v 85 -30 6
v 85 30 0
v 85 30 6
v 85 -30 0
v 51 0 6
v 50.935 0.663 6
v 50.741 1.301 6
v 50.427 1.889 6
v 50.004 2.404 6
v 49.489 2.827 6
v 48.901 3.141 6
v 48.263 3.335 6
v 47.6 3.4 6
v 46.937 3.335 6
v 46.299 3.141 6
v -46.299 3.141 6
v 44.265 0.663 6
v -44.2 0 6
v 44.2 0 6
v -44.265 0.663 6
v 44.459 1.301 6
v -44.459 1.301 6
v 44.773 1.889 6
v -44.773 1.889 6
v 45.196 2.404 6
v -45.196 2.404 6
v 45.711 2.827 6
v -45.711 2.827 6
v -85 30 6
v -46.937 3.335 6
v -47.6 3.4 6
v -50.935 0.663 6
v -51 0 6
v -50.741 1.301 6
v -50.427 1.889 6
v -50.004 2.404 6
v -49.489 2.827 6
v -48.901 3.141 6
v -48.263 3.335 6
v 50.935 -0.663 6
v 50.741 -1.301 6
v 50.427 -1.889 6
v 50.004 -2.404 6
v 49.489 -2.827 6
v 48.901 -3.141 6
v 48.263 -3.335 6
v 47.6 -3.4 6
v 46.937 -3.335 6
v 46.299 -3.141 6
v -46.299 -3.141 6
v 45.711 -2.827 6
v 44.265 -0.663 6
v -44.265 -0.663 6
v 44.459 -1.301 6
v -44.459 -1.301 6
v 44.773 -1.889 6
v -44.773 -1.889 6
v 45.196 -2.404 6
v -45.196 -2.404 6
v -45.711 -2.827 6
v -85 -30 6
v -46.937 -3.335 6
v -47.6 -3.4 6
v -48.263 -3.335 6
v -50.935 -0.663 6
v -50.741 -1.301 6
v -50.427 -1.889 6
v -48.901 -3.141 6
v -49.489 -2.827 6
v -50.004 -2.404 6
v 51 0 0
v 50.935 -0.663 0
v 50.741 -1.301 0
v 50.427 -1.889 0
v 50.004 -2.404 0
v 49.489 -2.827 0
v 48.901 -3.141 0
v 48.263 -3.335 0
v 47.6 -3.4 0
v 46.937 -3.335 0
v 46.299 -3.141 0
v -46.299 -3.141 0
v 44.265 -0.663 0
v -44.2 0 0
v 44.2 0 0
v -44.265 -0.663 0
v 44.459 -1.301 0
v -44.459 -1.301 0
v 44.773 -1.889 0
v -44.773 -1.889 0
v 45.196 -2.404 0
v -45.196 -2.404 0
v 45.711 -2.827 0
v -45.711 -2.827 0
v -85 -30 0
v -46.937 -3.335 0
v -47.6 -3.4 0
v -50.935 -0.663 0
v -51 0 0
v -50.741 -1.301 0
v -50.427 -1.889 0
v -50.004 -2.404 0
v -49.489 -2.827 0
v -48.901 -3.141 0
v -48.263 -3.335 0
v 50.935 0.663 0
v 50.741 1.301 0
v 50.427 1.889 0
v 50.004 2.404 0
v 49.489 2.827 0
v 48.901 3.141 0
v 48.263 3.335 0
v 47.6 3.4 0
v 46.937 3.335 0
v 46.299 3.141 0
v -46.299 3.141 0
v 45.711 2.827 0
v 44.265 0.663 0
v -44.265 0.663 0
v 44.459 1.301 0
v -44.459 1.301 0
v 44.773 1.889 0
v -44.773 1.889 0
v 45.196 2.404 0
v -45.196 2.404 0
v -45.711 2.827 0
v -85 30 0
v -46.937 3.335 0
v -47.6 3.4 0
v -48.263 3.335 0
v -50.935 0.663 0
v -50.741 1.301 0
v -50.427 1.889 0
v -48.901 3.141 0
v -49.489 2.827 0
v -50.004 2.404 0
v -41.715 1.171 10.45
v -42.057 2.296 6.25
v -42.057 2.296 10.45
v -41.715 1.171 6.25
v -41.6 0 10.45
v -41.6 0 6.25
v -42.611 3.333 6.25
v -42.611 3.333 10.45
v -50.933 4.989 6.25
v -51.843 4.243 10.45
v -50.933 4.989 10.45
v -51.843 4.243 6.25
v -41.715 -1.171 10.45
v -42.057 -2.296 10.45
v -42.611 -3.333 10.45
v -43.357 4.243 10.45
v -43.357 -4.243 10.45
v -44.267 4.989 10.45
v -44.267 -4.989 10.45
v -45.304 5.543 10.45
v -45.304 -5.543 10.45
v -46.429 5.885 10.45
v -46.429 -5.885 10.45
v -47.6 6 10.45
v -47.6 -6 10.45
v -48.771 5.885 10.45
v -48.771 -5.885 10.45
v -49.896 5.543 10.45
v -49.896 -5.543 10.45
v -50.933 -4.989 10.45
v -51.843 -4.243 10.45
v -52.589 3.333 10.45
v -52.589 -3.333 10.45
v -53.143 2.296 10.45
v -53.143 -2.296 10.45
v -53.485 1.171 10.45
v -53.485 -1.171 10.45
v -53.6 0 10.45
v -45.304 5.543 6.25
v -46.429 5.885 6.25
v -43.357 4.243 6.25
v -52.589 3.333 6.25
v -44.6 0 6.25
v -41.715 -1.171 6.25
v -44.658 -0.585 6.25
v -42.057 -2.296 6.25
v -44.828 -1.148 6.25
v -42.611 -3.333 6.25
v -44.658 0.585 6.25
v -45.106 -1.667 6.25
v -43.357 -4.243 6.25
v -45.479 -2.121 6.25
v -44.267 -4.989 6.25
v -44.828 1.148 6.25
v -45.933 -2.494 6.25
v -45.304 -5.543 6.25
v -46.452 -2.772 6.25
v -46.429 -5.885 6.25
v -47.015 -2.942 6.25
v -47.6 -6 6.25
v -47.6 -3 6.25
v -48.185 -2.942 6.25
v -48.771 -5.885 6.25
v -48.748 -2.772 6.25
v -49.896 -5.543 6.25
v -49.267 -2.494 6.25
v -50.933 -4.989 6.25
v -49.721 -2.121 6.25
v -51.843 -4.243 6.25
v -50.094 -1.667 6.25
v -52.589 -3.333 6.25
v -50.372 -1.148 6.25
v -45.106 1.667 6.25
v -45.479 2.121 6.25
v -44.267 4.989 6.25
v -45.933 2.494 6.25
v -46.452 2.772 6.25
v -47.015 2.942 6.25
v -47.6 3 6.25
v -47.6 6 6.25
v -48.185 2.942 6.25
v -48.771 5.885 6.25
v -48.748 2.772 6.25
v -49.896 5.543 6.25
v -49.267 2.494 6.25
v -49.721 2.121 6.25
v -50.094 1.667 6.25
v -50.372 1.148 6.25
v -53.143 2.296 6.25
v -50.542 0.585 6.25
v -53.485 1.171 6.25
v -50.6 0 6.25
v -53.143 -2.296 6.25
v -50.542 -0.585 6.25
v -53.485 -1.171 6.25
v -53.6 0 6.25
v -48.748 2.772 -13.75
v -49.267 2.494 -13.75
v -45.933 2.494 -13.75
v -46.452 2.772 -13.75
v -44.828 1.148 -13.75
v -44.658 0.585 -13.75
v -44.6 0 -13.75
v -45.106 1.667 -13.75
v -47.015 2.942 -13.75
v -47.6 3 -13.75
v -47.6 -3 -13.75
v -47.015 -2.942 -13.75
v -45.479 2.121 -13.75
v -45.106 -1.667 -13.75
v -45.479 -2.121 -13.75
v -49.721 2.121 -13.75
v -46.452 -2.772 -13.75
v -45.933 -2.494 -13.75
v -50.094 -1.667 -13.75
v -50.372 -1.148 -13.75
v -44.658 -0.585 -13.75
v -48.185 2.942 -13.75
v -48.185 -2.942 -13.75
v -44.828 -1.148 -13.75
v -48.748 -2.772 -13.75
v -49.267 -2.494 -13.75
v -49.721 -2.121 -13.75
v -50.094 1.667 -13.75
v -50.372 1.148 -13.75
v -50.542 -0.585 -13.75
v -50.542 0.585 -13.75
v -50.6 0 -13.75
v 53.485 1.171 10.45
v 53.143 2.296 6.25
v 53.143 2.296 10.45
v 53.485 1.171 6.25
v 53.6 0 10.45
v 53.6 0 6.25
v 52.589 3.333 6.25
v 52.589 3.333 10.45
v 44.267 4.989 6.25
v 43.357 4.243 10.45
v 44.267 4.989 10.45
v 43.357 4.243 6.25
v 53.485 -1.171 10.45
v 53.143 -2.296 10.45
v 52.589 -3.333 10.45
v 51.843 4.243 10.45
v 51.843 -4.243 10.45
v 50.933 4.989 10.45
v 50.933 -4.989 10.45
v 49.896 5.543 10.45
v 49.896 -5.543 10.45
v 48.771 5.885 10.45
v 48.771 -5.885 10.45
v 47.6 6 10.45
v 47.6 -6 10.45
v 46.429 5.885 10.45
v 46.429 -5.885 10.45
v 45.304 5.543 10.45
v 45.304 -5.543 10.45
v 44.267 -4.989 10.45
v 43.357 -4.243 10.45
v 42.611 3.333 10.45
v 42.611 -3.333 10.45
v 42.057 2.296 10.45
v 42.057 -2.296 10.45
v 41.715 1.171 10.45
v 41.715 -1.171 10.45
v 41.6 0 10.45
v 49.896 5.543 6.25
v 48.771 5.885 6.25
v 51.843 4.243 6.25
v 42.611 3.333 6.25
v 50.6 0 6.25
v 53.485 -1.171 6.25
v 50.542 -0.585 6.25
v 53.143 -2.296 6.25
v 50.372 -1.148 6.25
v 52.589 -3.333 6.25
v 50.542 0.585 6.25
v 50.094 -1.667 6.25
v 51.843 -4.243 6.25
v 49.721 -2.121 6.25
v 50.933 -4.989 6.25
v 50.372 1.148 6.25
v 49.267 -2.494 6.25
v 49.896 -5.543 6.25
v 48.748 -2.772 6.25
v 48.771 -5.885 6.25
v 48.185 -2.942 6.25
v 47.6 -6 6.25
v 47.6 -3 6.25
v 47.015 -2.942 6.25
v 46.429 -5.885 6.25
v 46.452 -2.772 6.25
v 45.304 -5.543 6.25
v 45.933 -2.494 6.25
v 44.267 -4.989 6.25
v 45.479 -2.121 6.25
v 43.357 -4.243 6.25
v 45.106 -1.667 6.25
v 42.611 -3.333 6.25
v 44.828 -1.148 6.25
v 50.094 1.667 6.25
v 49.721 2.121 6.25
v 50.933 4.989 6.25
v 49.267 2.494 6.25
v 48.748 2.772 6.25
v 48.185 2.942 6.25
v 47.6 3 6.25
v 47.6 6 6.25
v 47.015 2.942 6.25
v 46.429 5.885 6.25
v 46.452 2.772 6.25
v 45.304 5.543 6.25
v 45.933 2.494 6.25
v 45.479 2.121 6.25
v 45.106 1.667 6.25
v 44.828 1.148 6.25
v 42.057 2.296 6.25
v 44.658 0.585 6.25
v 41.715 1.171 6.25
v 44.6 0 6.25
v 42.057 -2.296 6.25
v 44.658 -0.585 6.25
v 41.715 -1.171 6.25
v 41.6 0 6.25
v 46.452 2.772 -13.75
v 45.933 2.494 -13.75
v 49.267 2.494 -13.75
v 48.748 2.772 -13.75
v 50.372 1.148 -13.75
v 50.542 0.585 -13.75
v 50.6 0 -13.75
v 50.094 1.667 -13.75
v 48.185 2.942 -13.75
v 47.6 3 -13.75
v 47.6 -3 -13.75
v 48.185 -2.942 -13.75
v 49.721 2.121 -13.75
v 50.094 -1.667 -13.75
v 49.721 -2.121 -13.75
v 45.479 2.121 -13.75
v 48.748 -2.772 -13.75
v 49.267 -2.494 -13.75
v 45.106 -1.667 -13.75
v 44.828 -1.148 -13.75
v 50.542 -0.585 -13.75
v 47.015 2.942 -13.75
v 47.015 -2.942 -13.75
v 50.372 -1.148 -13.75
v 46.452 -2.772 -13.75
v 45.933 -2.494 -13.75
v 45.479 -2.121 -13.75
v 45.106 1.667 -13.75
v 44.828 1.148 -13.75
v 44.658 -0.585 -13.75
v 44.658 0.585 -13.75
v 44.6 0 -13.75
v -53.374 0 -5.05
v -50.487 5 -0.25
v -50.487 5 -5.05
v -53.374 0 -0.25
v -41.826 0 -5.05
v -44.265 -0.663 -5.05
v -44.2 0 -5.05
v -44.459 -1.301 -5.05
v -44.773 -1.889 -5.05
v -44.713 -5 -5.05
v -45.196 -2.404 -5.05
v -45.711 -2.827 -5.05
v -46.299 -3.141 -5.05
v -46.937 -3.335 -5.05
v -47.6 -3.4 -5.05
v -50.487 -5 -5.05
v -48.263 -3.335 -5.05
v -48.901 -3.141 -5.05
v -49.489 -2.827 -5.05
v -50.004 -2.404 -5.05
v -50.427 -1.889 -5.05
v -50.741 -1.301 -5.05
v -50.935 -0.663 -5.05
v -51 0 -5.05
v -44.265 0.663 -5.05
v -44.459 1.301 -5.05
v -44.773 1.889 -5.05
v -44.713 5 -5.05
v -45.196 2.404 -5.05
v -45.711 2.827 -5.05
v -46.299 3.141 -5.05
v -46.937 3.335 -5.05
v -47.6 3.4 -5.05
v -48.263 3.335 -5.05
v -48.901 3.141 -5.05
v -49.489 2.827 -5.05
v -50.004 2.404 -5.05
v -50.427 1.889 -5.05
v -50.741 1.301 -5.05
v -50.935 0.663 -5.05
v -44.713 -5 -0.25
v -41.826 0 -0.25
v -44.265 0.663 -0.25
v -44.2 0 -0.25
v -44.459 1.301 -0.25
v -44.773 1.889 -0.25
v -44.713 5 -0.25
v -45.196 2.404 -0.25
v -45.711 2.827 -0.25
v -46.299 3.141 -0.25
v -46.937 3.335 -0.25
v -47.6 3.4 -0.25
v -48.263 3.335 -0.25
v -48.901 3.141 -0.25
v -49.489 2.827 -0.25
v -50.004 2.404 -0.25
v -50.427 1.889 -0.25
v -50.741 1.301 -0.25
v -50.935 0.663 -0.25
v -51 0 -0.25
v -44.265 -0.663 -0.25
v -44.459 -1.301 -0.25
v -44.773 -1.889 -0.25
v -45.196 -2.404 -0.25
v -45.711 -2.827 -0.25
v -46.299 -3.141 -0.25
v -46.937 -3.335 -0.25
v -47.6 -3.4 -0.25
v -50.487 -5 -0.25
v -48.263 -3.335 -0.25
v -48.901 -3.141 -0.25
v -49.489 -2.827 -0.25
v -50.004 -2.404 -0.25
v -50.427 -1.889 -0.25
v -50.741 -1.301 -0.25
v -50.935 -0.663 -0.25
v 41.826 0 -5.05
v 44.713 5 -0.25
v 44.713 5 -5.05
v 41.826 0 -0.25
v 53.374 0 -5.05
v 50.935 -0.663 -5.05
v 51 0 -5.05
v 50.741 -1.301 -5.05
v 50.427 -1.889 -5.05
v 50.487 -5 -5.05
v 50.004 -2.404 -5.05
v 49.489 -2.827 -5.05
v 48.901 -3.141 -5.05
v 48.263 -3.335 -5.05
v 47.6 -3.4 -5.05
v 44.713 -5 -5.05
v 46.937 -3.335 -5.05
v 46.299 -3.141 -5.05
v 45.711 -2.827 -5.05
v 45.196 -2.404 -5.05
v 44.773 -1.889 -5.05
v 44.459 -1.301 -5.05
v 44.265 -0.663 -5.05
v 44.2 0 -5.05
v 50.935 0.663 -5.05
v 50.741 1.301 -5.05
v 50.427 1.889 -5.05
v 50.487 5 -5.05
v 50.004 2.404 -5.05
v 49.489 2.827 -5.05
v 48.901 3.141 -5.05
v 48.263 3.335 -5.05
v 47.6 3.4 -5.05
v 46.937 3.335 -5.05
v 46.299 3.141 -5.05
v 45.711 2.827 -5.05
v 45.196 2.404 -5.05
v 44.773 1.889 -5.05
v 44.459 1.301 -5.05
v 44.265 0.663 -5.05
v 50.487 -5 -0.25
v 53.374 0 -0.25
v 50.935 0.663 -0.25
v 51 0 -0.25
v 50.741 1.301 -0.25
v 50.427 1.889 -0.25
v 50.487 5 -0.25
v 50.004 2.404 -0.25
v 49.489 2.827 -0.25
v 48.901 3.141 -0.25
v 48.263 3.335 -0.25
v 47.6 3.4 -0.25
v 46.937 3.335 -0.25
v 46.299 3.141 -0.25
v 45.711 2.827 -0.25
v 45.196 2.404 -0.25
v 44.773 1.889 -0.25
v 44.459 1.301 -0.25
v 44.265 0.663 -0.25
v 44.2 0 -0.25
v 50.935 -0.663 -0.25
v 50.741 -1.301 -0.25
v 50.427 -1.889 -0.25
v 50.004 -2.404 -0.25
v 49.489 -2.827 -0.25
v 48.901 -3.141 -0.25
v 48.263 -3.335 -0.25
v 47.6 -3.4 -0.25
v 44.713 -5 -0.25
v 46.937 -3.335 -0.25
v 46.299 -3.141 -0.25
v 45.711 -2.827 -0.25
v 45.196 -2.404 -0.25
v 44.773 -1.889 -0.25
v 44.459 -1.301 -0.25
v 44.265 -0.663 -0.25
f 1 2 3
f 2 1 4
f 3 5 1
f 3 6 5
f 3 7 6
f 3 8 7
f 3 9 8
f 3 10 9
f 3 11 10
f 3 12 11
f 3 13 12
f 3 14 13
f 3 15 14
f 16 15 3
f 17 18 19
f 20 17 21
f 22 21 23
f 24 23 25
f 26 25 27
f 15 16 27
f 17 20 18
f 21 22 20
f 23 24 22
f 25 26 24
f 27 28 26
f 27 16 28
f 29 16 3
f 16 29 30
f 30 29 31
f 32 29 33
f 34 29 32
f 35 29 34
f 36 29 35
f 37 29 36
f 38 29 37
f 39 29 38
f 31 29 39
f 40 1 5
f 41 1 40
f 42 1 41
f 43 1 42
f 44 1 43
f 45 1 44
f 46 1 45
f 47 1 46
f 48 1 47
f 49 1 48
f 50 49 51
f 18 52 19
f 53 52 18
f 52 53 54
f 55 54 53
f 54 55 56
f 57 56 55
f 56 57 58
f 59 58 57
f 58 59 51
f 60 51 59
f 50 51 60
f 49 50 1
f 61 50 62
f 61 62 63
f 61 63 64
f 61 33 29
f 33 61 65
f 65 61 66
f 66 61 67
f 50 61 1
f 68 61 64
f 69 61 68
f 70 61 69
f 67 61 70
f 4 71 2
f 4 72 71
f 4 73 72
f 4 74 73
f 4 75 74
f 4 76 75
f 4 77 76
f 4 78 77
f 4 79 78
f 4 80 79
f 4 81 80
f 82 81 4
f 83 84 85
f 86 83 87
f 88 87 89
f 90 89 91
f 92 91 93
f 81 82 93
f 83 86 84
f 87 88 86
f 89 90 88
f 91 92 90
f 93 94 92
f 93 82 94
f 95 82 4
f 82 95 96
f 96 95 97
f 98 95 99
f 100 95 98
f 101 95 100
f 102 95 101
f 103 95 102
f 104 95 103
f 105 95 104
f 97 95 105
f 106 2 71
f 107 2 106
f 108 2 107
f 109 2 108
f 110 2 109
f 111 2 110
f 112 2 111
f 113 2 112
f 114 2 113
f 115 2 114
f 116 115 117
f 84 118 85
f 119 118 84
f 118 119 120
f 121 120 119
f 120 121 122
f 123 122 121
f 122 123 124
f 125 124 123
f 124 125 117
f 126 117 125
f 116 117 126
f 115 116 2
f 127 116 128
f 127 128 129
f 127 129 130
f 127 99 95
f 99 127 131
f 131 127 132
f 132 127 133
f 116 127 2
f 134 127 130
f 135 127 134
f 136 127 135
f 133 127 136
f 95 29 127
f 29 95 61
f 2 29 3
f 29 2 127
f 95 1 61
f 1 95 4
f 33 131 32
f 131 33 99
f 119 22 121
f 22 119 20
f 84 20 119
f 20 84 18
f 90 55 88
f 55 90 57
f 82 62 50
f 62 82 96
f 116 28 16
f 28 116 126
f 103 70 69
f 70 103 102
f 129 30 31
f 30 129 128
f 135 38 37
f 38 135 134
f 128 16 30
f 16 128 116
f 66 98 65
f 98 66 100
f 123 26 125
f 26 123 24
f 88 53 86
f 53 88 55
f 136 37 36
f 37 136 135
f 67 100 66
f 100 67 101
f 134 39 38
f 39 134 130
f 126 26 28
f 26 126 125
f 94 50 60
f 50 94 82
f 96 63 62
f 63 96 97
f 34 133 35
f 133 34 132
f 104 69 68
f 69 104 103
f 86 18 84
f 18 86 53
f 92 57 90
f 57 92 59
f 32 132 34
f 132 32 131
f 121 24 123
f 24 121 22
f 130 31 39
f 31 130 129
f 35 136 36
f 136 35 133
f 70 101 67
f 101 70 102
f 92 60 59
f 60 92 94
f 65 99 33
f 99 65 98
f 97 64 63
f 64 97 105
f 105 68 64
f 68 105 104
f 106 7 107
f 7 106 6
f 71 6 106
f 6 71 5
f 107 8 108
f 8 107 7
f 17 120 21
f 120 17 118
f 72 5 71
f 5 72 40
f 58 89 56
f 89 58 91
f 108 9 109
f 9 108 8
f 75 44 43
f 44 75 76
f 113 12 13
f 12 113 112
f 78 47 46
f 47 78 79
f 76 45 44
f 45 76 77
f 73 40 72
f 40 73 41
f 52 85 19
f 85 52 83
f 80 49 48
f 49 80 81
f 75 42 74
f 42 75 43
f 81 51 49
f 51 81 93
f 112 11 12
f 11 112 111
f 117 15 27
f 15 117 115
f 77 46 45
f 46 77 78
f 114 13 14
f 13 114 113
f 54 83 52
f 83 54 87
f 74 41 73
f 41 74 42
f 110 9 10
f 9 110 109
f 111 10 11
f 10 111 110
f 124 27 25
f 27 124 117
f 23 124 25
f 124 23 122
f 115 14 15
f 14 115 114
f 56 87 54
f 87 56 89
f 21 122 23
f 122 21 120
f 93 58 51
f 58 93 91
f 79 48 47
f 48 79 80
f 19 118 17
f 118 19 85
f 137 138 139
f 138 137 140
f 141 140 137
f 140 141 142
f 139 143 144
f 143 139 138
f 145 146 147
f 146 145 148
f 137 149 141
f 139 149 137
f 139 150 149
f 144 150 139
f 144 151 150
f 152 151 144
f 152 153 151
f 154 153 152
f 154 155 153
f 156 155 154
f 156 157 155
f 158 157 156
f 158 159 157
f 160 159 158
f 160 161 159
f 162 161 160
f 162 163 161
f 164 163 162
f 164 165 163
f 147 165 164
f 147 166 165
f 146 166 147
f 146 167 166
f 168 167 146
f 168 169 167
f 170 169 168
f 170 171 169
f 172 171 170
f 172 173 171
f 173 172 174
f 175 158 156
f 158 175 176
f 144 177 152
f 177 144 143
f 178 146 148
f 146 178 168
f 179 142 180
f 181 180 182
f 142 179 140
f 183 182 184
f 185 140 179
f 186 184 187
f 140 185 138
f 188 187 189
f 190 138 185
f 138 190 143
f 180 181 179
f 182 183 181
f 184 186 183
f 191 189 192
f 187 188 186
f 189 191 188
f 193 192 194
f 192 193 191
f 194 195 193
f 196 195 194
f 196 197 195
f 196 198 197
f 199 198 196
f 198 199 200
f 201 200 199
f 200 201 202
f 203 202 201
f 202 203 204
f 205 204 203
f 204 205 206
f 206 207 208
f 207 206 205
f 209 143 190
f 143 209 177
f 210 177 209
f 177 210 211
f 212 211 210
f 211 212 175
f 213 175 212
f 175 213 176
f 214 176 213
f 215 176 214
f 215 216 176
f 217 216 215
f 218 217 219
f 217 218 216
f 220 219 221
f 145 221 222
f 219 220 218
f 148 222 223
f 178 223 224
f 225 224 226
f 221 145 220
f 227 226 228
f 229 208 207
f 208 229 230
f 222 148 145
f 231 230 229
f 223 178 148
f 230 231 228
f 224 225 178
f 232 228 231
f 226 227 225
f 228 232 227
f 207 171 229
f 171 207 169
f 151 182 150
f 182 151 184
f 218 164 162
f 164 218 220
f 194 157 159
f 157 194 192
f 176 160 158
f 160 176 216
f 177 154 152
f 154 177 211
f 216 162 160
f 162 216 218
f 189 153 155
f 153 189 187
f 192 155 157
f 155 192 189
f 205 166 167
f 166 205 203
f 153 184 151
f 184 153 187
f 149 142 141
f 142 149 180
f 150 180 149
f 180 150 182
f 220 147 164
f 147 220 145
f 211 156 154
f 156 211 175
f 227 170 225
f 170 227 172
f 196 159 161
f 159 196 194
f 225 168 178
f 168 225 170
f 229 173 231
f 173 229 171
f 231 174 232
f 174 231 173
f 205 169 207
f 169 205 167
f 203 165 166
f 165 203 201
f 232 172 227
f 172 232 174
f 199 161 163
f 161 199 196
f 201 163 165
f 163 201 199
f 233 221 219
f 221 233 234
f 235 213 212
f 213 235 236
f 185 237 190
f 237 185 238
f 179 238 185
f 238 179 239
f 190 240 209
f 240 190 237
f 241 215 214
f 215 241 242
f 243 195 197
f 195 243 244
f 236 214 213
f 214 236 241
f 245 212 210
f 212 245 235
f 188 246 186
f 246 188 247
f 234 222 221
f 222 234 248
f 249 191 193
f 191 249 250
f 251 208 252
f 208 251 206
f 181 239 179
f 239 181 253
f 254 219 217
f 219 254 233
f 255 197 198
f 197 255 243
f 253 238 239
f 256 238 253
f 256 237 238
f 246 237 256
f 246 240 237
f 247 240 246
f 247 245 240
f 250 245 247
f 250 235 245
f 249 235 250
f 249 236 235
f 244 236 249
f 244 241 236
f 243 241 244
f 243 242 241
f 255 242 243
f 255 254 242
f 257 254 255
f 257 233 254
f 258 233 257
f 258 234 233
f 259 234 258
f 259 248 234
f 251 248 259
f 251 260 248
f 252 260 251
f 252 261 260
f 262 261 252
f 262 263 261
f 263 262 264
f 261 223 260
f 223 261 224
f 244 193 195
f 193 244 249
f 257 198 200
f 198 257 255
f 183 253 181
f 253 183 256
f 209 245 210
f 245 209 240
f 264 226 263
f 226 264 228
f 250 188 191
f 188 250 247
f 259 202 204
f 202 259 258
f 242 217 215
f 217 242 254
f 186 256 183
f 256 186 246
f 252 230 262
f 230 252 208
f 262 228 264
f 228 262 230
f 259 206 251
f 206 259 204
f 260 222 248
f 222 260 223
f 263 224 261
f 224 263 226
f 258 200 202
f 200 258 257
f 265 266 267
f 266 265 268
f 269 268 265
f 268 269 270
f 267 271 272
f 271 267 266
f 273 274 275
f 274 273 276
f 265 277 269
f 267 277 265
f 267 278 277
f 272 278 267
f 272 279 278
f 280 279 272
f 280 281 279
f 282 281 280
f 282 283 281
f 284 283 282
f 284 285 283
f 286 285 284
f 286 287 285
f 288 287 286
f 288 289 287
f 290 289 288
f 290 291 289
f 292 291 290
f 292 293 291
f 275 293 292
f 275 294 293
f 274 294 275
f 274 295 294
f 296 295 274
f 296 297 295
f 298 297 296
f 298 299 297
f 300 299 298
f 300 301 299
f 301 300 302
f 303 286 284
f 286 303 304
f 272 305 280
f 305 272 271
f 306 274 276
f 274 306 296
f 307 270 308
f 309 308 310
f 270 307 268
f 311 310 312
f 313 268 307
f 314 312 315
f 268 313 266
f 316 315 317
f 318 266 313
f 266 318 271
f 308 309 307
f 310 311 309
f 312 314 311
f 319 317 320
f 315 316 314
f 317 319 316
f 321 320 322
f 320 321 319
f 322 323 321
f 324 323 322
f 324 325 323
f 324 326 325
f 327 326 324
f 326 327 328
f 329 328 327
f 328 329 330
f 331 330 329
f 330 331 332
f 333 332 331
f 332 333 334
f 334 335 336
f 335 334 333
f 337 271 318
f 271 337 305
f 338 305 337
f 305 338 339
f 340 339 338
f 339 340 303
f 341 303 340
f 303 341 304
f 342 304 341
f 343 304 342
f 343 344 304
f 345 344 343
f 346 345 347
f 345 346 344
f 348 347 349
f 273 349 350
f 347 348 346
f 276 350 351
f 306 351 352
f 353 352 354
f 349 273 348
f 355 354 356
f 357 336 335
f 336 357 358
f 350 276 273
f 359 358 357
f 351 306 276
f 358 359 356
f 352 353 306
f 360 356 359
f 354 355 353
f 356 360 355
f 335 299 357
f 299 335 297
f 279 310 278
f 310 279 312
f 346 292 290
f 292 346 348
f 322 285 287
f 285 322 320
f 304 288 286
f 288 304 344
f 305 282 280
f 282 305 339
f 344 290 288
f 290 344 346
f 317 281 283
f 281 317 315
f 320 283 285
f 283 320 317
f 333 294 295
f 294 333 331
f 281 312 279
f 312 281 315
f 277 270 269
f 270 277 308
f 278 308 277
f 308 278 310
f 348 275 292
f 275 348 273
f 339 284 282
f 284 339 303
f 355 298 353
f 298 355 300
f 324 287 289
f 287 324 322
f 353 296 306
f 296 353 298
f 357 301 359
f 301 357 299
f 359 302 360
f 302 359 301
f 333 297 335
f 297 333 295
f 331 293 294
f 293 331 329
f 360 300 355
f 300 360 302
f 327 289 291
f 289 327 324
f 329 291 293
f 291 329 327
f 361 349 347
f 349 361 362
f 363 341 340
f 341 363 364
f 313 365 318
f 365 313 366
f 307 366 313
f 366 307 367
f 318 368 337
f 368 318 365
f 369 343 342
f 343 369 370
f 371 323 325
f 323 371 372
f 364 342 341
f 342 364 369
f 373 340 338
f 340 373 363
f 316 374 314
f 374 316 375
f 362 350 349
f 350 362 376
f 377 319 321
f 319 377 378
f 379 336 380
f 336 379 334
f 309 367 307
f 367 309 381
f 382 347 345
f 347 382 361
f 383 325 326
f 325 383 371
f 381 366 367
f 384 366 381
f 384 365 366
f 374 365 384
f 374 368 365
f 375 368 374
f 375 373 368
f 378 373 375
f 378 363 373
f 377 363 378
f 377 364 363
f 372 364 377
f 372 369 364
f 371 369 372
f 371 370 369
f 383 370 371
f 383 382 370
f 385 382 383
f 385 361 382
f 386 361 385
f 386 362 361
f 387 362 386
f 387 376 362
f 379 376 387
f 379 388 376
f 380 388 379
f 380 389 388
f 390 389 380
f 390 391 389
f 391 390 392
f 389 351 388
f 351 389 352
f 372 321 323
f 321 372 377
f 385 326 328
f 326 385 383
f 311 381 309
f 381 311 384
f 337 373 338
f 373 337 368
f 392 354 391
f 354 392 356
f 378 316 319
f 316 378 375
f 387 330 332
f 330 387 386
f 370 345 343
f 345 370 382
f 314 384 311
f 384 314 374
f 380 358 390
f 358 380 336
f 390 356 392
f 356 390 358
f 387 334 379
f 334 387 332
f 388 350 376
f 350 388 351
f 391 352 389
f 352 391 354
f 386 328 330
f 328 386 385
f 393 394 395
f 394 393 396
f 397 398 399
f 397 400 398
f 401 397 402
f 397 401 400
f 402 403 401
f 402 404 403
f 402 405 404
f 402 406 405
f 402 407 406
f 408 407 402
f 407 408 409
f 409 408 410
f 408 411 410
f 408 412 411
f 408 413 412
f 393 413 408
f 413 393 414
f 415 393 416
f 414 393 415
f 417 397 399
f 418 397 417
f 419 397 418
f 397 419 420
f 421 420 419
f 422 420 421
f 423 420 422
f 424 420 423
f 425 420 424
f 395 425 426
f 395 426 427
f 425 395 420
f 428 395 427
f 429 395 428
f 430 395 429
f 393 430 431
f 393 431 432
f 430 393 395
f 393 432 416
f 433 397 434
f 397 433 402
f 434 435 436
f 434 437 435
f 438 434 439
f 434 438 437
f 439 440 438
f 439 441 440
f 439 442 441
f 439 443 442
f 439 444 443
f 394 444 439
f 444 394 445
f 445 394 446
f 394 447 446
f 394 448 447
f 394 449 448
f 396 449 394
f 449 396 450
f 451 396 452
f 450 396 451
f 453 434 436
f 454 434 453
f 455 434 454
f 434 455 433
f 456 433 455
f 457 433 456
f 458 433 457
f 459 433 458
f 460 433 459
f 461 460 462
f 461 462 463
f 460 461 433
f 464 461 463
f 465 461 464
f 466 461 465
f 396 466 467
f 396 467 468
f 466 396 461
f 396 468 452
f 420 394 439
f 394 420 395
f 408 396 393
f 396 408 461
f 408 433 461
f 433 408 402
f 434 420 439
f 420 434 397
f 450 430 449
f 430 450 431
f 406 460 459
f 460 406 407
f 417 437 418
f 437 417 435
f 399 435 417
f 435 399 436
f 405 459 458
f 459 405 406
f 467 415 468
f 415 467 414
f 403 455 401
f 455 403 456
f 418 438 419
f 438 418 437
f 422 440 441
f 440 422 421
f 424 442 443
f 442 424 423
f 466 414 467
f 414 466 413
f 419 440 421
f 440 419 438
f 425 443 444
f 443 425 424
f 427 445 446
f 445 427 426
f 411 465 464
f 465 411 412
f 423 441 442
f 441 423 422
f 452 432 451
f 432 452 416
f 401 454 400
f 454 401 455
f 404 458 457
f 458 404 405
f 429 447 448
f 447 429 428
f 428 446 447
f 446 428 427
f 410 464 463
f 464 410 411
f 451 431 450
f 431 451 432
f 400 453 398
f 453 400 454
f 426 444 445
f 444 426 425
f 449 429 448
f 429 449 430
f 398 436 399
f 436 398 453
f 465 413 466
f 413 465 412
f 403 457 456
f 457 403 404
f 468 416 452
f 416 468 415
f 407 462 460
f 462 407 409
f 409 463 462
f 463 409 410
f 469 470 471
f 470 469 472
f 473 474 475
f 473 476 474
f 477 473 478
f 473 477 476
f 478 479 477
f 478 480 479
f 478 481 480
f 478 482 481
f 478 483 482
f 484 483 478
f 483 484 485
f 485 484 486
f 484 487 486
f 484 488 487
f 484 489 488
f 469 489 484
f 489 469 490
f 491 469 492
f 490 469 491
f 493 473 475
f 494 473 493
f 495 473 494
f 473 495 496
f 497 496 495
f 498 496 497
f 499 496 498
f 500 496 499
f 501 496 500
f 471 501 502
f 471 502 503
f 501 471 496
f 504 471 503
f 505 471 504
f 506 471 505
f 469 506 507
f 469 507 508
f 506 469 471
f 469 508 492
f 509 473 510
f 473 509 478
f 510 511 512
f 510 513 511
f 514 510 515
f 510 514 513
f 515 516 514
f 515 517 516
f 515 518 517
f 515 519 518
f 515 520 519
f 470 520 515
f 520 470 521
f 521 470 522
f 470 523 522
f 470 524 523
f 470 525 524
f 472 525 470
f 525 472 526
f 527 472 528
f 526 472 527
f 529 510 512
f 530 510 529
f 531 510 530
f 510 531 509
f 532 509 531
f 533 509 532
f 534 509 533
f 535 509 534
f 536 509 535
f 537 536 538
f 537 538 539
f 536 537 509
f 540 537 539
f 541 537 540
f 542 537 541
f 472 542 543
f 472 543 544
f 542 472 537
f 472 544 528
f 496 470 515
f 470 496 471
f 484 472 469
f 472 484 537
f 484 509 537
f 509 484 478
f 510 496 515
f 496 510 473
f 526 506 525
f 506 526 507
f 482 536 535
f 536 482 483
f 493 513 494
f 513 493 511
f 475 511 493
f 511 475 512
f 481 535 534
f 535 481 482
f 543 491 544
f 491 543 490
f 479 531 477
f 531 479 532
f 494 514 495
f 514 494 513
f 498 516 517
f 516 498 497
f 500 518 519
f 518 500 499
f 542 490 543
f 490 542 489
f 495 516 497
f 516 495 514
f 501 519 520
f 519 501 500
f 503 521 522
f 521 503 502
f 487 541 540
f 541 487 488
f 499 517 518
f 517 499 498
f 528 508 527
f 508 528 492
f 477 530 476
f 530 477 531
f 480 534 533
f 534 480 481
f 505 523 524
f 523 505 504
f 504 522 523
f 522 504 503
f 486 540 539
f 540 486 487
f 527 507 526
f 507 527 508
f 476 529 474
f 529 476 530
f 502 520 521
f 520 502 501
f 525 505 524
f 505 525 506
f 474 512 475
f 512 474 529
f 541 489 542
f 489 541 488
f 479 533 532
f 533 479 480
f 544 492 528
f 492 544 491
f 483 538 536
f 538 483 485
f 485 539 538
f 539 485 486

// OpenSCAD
$fn = 32;

// ------------------------------------------------------------------------
// Bolted plate: 170 x 60 x 6 mm plate, 2 fasteners
// Every part is its own module, assembly() places them once.
// ------------------------------------------------------------------------

// --- part 1 ---
module plate() {
  difference() {
    translate([-85, -30, 0]) cube([170, 60, 6]);
    translate([-47.6, 0, -1]) cylinder(h = 8, d = 6.8);
    translate([47.6, 0, -1]) cylinder(h = 8, d = 6.8);
  }
}

// --- part 2 ---
module bolt1() {
  cylinder(h = 4.2, d = 12);
  translate([0, 0, -20]) cylinder(h = 20, d = 6);
}

// --- part 3 ---
module bolt2() {
  cylinder(h = 4.2, d = 12);
  translate([0, 0, -20]) cylinder(h = 20, d = 6);
}

// --- part 4 ---
module nut1() {
  difference() {
    linear_extrude(height = 4.8) polygon(points = [[5.774, 0], [2.887, 5], [-2.887, 5], [-5.774, 0], [-2.887, -5], [2.887, -5]]);
    translate([0, 0, -1]) cylinder(h = 6.8, d = 6.8);
  }
}

// --- part 5 ---
module nut2() {
  difference() {
    linear_extrude(height = 4.8) polygon(points = [[5.774, 0], [2.887, 5], [-2.887, 5], [-5.774, 0], [-2.887, -5], [2.887, -5]]);
    translate([0, 0, -1]) cylinder(h = 6.8, d = 6.8);
  }
}

// --- assembly ---
module assembly() {
  translate([0, 0, 0]) rotate([0, 0, 0]) plate();
  translate([-47.6, 0, 6.25]) rotate([0, 0, 0]) bolt1();
  translate([47.6, 0, 6.25]) rotate([0, 0, 0]) bolt2();
  translate([-47.6, 0, -5.05]) rotate([0, 0, 0]) nut1();
  translate([47.6, 0, -5.05]) rotate([0, 0, 0]) nut2();
}

assembly();
